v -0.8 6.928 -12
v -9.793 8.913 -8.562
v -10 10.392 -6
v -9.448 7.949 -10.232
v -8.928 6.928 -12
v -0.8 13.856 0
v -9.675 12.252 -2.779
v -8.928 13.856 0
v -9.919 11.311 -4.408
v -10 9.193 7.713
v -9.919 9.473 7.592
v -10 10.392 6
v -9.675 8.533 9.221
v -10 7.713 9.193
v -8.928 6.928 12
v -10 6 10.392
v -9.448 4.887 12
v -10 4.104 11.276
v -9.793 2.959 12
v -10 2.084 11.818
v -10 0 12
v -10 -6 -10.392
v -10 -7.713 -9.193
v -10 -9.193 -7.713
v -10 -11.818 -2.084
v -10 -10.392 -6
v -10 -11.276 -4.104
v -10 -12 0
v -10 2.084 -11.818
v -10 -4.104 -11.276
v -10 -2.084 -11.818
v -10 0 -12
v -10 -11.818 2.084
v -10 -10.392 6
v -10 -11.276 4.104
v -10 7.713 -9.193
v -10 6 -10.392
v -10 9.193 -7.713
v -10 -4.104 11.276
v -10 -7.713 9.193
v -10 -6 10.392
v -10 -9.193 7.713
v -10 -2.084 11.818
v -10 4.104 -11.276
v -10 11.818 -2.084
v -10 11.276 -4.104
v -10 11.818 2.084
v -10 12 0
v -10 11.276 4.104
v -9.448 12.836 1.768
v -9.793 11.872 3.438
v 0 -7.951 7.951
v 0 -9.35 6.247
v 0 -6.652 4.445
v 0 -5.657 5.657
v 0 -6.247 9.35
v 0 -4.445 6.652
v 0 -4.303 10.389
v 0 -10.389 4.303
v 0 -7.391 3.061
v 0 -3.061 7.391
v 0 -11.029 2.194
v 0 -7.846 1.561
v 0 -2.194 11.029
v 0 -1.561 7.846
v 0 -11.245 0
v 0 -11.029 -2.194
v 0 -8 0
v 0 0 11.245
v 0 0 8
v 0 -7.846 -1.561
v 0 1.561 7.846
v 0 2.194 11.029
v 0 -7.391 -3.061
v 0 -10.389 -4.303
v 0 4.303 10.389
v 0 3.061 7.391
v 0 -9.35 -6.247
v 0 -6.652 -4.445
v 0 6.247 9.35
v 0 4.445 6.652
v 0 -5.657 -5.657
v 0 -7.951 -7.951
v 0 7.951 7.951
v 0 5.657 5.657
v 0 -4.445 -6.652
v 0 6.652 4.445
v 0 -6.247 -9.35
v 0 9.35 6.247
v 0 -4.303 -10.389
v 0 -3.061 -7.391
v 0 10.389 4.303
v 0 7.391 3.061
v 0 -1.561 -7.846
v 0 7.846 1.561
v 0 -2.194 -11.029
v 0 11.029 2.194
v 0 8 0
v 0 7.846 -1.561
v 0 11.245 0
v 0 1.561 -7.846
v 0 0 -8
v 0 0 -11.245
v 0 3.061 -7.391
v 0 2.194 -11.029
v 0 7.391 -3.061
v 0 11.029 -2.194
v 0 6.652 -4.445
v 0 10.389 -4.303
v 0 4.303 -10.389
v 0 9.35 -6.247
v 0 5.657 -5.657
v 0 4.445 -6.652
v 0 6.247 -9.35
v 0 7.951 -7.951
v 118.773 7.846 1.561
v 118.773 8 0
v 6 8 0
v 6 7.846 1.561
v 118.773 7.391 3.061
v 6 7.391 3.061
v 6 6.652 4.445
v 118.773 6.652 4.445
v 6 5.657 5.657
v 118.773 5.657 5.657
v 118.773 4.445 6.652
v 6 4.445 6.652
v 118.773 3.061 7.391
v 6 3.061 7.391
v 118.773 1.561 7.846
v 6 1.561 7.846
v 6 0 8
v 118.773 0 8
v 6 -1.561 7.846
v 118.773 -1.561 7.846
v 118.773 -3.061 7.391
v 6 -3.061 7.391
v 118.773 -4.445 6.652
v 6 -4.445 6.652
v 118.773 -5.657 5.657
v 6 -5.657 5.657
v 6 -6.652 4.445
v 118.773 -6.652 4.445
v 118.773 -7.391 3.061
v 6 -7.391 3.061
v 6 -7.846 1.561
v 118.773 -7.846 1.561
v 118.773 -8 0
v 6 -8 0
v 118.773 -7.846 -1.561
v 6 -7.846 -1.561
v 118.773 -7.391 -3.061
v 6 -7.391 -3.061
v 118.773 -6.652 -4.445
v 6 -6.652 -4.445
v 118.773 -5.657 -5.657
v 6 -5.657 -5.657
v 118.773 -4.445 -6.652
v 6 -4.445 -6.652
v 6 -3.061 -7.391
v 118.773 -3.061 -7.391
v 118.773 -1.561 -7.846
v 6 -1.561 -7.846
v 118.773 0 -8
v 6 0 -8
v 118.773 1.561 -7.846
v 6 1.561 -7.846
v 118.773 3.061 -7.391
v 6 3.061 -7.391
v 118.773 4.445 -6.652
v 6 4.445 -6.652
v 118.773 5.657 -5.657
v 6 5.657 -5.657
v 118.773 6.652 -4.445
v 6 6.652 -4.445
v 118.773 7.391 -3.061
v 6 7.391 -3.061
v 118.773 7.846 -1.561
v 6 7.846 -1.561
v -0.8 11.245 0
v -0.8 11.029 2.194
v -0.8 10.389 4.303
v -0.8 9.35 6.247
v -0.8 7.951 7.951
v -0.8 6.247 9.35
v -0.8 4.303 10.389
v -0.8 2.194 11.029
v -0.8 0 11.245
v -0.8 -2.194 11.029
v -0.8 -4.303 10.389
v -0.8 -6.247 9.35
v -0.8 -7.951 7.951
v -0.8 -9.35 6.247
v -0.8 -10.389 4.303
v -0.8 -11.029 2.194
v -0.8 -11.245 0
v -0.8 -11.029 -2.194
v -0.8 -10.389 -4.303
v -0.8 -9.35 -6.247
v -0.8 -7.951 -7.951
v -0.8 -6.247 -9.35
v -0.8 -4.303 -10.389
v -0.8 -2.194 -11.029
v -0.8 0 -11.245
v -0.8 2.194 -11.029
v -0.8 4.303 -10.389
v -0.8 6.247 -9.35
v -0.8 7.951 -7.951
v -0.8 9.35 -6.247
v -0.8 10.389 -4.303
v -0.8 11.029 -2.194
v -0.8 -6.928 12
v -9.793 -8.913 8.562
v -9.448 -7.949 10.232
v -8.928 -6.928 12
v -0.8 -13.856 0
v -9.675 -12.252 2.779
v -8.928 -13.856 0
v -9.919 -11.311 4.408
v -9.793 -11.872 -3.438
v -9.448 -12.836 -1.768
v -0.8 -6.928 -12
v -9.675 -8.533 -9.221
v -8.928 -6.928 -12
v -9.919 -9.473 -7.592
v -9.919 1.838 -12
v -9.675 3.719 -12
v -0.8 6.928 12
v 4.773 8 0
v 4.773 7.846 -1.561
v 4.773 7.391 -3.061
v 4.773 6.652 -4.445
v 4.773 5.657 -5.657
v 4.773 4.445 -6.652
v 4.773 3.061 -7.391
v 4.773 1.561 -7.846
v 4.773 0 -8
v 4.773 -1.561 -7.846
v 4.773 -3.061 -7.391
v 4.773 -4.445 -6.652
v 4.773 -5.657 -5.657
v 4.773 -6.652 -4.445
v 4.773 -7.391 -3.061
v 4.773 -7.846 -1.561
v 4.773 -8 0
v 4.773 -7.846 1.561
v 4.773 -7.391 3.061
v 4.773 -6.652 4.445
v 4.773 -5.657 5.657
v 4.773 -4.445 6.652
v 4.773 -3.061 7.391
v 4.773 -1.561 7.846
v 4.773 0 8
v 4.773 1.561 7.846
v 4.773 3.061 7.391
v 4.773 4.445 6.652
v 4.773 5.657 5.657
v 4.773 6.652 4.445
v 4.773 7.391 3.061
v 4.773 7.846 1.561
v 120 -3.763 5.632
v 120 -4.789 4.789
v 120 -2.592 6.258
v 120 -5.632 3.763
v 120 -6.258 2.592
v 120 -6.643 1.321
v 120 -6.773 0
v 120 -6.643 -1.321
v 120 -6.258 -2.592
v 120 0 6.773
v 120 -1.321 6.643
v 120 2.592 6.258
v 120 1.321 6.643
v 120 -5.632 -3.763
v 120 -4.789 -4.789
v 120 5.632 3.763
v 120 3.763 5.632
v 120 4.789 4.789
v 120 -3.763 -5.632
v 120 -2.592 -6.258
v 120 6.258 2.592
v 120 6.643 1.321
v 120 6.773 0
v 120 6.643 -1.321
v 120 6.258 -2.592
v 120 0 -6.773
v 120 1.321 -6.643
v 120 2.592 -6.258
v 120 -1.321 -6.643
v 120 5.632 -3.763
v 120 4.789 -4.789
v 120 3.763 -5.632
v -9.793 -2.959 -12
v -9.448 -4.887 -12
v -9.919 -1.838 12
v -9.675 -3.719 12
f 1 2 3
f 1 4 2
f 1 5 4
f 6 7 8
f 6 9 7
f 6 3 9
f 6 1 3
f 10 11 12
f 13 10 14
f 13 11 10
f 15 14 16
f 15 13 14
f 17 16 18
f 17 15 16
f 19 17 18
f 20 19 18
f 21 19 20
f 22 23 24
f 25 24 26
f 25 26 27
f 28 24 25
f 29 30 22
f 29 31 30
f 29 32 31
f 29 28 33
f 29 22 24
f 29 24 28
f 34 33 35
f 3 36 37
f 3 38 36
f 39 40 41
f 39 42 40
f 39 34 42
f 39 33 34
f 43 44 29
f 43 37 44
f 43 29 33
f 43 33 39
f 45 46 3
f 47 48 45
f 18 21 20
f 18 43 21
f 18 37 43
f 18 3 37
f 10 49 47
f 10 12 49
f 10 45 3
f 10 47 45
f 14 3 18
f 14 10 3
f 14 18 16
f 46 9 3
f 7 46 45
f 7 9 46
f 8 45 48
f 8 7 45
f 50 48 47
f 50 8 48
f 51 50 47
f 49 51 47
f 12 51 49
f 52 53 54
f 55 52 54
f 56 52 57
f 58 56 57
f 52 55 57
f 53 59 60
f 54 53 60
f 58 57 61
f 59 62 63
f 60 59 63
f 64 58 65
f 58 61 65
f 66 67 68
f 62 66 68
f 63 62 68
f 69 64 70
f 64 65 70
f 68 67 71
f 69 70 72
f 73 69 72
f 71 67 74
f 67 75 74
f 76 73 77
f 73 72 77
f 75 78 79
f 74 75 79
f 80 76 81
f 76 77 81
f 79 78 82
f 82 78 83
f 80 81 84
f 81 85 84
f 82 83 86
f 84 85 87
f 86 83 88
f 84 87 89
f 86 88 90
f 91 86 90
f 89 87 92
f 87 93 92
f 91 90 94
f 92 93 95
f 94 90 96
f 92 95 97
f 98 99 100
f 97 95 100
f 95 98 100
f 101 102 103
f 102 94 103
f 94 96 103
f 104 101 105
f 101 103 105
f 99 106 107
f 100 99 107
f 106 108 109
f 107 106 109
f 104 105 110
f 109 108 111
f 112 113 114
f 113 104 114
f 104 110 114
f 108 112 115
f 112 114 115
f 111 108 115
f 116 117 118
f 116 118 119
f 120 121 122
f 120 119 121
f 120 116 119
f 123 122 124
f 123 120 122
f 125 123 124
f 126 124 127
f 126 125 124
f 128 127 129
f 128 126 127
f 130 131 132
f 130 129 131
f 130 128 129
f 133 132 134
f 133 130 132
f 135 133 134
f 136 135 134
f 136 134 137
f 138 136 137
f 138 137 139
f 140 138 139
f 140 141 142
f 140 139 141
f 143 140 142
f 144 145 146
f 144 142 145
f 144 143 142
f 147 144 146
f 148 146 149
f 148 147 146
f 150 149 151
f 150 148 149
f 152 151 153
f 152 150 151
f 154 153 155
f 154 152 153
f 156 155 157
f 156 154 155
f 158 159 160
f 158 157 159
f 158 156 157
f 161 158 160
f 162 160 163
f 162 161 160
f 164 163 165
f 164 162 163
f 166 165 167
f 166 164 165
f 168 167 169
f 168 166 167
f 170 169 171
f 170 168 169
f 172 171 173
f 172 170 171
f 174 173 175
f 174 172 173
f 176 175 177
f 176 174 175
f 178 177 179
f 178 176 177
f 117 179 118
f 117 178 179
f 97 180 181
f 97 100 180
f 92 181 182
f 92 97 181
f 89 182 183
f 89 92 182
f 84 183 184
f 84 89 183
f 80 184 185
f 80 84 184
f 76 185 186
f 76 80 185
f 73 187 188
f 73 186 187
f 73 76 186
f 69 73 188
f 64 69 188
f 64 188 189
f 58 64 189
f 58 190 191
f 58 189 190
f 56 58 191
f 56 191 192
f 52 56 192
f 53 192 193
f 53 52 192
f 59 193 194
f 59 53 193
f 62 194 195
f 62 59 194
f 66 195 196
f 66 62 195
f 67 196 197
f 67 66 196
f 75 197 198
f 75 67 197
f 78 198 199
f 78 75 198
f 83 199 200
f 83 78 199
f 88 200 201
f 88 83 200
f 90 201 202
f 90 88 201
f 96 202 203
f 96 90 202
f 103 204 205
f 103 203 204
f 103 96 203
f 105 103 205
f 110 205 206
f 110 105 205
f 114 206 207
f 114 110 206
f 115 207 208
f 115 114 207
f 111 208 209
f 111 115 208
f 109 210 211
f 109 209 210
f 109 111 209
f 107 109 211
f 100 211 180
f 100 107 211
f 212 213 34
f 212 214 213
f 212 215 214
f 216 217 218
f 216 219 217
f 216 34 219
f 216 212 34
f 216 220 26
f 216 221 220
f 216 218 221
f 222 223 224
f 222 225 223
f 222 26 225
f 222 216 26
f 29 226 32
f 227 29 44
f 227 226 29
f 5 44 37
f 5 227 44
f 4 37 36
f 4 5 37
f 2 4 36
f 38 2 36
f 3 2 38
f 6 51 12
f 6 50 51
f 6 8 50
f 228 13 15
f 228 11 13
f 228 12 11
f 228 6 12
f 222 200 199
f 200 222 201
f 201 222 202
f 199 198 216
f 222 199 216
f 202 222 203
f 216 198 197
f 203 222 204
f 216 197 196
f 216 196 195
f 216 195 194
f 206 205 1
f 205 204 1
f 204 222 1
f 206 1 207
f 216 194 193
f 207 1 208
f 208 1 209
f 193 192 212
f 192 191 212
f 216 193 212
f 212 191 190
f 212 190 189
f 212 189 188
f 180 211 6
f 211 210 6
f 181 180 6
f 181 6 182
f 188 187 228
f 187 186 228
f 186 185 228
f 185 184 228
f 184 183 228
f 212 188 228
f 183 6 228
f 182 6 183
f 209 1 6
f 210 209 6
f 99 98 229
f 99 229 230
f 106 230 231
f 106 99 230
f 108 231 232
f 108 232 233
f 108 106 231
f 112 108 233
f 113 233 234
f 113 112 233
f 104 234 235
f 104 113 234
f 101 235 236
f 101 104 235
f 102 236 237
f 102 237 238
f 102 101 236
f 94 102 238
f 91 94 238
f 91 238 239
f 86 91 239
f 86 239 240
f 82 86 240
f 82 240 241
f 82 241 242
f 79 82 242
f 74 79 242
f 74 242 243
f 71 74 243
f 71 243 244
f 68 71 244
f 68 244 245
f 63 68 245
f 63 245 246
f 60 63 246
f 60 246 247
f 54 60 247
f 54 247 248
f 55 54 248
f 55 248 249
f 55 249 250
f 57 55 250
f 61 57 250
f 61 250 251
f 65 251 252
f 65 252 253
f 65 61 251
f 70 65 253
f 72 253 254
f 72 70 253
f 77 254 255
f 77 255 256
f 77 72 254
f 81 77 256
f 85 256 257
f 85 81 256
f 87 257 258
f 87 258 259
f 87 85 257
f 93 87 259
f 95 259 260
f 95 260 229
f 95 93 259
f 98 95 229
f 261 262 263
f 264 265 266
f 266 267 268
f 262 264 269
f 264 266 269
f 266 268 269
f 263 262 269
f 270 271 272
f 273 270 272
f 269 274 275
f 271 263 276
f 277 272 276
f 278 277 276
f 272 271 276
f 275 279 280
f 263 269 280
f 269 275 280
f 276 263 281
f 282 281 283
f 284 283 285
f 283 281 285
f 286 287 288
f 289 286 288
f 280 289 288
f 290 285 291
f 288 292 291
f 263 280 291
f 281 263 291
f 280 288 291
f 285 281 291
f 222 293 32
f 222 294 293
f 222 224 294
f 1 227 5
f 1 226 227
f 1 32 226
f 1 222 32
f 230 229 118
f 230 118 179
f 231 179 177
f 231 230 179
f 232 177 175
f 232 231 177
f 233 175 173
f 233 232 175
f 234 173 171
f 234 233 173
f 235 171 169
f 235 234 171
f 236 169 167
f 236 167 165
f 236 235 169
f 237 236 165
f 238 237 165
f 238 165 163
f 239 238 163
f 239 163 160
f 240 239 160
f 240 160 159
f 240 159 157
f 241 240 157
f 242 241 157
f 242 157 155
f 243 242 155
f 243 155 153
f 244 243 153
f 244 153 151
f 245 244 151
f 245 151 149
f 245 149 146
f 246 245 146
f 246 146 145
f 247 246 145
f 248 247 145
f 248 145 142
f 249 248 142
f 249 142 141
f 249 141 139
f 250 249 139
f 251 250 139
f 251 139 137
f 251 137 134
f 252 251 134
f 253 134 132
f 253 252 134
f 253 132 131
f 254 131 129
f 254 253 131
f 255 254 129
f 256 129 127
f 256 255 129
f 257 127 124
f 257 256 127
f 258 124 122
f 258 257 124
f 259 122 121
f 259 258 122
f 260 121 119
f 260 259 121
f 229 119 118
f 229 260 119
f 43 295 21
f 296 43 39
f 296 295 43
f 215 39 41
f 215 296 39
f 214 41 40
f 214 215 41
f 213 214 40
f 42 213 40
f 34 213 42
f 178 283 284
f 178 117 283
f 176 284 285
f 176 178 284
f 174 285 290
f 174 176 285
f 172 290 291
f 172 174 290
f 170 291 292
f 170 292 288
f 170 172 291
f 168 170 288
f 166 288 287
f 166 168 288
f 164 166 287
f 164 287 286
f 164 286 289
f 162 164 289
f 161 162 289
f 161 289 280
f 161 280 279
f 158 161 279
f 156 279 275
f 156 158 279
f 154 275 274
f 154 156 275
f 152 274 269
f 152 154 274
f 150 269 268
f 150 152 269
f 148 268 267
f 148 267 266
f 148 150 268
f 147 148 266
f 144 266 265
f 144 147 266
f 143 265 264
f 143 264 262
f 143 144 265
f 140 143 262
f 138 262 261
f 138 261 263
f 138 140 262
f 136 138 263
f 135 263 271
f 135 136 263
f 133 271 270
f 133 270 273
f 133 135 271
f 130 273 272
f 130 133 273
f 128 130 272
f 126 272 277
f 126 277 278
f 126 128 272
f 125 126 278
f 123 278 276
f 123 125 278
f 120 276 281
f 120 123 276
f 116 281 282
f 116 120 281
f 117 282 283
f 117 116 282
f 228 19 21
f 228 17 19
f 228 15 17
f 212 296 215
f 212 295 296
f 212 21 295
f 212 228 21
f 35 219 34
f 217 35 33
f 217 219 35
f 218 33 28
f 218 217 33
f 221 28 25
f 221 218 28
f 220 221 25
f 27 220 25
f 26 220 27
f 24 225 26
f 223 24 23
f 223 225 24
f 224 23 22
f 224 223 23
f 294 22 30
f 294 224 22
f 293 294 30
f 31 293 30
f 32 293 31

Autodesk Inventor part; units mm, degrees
ref_plane "YZ Plane" through (0, 0, 0) normal (1, 0, 0) x (0, 1, 0)
ref_plane "XZ Plane" through (0, 0, 0) normal (0, 1, 0) x (-1, 0, 0)
sketch "Sketch1" plane through (0, 0, 0) normal (0, 0, 1) x (1, 0, 0)
  line L0 (0, 11.245) -> (0, 8)
  line L1 (6, 8) -> (120, 8)
  line L2 (120, 8) -> (120, 0)
  line L3 (120, 0) -> (-0.8001, 0)
  line L4 (-24.9601, 0) -> (144.16, 0) projected
  line L5 (-0.8001, 0) -> (-0.8001, 11.245)
  line L6 (-0.8001, 11.245) -> (0, 11.245)
  line L7 (6, 8) -> (4.773, 8)
  line L8 (4.773, 8) -> (0, 8)
  line L9 (0, -2.249) -> (0, 13.494) projected
  dimension "d0" = 120
  dimension "d1" = 114
  dimension "d2" = 16
  dimension "d9" = 0.8001
  dimension "d10" = 22.49
  dimension "d13" = 1.227
  dimension "d14" = 16
revolve "Body" add sketch "Sketch1" angle 360 about axis through (120, 0, 0) along (-1, 0, 0)
sketch "Sketch2" plane through (-0.8001, 0, 0) normal (-1, 0, 0) x (0, 0, 1)
  line L0 (0, 13.8564) -> (12, 6.9282)
  line L1 (12, 6.9282) -> (12, -6.9282)
  line L2 (12, -6.9282) -> (0, -13.8564)
  line L3 (0, -13.8564) -> (-12, -6.9282)
  line L4 (-12, -6.9282) -> (-12, 6.9282)
  line L5 (-12, 6.9282) -> (0, 13.8564)
  point P0 (0, 0)
  point P1 (0, 0)
  dimension "d11" = 24
extrude "Head" add sketch "Sketch2" along normal blind 9.2
sketch "Sketch4" plane through (0, 0, 0) normal (0, 0, 1) x (1, 0, 0)
  line L0 (-10.0001, 12) -> (-10.0001, 13.8564)
  line L1 (-10.0001, 13.8564) -> (-8.9283, 13.8564)
  line L2 (-8.9283, 13.8564) -> (-10.0001, 12)
  line L3 (-11.8401, 0) -> (1.0399, 0) projected
  line L4 (-0.8001, 13.8564) -> (-10.0001, 13.8564) projected
  line L5 (-10.0001, 6.9282) -> (-10.0001, 13.8564) projected
  dimension "d5" = 30
  dimension "d19" = 24
revolve "Chamfer1" cut sketch "Sketch4" angle 360 about axis through (-10, 0, 0) along (1, 0, 0)
thread "Thread" size "M16x2" class "6g" standard "ISO Metric profile" length 114
chamfer "Chamfer2" distance 1.2269 distance2 1.227 1 edges at (120, -8, 0) measured on face at (120, 0.8907, 2.0408)
ref_plane "Work Plane1" through (1.525, 0, 0) normal (0, 0, 1) x (1, 0, 0)
equation "\"d0\" = NLG"
equation "\"d1\" = GEL"
equation "\"d2\" = GD"
equation "\"d10\" = SD2"
equation "\"d14\" = BDM"
equation "\"d11\" = SW"
equation "\"d3\" = KOH - SD"
equation "\"d5\" = ANG1"
equation "\"d19\" = SW0"
equation "\"d15\" = GEL"
equation "\"d6\" = -0.5 * SPD + 0.5 * GD"
equation "\"NLG\" = 120"
equation "\"GD\" = NND"
equation "\"BDM\" = NND"
equation "\"KOH\" = 10"
equation "\"GEL\" = 114"
equation "\"SW\" = 24"
equation "\"SW0\" = SW"
equation "\"SPD\" = NND - 1.2269 * PTC"
equation "\"SD2\" = 22.49"
equation "\"SD\" = 0.8"
equation "\"ANG1\" = 30deg"
equation "\"GAL\" = 0.61345 * PTC"
equation "\"GUL\" = 0.61345 * PTC"
equation "\"RR\" = 0.6"
equation "\"GD1\" = THREADDIA - 1.2269 * PTC"
equation "\"THREADDIA\" = 16"
equation "\"SDH\" = SD2"
equation "\"SDHG\" = 6"
equation "\"TOA\" = 30deg"
equation "\"PTC\" = 2"
equation "\"NND\" = 16"
equation "\"E0\" = 27.72"
properties part number "ISO 4017 - M16 x 120" material "Steel, Mild"
